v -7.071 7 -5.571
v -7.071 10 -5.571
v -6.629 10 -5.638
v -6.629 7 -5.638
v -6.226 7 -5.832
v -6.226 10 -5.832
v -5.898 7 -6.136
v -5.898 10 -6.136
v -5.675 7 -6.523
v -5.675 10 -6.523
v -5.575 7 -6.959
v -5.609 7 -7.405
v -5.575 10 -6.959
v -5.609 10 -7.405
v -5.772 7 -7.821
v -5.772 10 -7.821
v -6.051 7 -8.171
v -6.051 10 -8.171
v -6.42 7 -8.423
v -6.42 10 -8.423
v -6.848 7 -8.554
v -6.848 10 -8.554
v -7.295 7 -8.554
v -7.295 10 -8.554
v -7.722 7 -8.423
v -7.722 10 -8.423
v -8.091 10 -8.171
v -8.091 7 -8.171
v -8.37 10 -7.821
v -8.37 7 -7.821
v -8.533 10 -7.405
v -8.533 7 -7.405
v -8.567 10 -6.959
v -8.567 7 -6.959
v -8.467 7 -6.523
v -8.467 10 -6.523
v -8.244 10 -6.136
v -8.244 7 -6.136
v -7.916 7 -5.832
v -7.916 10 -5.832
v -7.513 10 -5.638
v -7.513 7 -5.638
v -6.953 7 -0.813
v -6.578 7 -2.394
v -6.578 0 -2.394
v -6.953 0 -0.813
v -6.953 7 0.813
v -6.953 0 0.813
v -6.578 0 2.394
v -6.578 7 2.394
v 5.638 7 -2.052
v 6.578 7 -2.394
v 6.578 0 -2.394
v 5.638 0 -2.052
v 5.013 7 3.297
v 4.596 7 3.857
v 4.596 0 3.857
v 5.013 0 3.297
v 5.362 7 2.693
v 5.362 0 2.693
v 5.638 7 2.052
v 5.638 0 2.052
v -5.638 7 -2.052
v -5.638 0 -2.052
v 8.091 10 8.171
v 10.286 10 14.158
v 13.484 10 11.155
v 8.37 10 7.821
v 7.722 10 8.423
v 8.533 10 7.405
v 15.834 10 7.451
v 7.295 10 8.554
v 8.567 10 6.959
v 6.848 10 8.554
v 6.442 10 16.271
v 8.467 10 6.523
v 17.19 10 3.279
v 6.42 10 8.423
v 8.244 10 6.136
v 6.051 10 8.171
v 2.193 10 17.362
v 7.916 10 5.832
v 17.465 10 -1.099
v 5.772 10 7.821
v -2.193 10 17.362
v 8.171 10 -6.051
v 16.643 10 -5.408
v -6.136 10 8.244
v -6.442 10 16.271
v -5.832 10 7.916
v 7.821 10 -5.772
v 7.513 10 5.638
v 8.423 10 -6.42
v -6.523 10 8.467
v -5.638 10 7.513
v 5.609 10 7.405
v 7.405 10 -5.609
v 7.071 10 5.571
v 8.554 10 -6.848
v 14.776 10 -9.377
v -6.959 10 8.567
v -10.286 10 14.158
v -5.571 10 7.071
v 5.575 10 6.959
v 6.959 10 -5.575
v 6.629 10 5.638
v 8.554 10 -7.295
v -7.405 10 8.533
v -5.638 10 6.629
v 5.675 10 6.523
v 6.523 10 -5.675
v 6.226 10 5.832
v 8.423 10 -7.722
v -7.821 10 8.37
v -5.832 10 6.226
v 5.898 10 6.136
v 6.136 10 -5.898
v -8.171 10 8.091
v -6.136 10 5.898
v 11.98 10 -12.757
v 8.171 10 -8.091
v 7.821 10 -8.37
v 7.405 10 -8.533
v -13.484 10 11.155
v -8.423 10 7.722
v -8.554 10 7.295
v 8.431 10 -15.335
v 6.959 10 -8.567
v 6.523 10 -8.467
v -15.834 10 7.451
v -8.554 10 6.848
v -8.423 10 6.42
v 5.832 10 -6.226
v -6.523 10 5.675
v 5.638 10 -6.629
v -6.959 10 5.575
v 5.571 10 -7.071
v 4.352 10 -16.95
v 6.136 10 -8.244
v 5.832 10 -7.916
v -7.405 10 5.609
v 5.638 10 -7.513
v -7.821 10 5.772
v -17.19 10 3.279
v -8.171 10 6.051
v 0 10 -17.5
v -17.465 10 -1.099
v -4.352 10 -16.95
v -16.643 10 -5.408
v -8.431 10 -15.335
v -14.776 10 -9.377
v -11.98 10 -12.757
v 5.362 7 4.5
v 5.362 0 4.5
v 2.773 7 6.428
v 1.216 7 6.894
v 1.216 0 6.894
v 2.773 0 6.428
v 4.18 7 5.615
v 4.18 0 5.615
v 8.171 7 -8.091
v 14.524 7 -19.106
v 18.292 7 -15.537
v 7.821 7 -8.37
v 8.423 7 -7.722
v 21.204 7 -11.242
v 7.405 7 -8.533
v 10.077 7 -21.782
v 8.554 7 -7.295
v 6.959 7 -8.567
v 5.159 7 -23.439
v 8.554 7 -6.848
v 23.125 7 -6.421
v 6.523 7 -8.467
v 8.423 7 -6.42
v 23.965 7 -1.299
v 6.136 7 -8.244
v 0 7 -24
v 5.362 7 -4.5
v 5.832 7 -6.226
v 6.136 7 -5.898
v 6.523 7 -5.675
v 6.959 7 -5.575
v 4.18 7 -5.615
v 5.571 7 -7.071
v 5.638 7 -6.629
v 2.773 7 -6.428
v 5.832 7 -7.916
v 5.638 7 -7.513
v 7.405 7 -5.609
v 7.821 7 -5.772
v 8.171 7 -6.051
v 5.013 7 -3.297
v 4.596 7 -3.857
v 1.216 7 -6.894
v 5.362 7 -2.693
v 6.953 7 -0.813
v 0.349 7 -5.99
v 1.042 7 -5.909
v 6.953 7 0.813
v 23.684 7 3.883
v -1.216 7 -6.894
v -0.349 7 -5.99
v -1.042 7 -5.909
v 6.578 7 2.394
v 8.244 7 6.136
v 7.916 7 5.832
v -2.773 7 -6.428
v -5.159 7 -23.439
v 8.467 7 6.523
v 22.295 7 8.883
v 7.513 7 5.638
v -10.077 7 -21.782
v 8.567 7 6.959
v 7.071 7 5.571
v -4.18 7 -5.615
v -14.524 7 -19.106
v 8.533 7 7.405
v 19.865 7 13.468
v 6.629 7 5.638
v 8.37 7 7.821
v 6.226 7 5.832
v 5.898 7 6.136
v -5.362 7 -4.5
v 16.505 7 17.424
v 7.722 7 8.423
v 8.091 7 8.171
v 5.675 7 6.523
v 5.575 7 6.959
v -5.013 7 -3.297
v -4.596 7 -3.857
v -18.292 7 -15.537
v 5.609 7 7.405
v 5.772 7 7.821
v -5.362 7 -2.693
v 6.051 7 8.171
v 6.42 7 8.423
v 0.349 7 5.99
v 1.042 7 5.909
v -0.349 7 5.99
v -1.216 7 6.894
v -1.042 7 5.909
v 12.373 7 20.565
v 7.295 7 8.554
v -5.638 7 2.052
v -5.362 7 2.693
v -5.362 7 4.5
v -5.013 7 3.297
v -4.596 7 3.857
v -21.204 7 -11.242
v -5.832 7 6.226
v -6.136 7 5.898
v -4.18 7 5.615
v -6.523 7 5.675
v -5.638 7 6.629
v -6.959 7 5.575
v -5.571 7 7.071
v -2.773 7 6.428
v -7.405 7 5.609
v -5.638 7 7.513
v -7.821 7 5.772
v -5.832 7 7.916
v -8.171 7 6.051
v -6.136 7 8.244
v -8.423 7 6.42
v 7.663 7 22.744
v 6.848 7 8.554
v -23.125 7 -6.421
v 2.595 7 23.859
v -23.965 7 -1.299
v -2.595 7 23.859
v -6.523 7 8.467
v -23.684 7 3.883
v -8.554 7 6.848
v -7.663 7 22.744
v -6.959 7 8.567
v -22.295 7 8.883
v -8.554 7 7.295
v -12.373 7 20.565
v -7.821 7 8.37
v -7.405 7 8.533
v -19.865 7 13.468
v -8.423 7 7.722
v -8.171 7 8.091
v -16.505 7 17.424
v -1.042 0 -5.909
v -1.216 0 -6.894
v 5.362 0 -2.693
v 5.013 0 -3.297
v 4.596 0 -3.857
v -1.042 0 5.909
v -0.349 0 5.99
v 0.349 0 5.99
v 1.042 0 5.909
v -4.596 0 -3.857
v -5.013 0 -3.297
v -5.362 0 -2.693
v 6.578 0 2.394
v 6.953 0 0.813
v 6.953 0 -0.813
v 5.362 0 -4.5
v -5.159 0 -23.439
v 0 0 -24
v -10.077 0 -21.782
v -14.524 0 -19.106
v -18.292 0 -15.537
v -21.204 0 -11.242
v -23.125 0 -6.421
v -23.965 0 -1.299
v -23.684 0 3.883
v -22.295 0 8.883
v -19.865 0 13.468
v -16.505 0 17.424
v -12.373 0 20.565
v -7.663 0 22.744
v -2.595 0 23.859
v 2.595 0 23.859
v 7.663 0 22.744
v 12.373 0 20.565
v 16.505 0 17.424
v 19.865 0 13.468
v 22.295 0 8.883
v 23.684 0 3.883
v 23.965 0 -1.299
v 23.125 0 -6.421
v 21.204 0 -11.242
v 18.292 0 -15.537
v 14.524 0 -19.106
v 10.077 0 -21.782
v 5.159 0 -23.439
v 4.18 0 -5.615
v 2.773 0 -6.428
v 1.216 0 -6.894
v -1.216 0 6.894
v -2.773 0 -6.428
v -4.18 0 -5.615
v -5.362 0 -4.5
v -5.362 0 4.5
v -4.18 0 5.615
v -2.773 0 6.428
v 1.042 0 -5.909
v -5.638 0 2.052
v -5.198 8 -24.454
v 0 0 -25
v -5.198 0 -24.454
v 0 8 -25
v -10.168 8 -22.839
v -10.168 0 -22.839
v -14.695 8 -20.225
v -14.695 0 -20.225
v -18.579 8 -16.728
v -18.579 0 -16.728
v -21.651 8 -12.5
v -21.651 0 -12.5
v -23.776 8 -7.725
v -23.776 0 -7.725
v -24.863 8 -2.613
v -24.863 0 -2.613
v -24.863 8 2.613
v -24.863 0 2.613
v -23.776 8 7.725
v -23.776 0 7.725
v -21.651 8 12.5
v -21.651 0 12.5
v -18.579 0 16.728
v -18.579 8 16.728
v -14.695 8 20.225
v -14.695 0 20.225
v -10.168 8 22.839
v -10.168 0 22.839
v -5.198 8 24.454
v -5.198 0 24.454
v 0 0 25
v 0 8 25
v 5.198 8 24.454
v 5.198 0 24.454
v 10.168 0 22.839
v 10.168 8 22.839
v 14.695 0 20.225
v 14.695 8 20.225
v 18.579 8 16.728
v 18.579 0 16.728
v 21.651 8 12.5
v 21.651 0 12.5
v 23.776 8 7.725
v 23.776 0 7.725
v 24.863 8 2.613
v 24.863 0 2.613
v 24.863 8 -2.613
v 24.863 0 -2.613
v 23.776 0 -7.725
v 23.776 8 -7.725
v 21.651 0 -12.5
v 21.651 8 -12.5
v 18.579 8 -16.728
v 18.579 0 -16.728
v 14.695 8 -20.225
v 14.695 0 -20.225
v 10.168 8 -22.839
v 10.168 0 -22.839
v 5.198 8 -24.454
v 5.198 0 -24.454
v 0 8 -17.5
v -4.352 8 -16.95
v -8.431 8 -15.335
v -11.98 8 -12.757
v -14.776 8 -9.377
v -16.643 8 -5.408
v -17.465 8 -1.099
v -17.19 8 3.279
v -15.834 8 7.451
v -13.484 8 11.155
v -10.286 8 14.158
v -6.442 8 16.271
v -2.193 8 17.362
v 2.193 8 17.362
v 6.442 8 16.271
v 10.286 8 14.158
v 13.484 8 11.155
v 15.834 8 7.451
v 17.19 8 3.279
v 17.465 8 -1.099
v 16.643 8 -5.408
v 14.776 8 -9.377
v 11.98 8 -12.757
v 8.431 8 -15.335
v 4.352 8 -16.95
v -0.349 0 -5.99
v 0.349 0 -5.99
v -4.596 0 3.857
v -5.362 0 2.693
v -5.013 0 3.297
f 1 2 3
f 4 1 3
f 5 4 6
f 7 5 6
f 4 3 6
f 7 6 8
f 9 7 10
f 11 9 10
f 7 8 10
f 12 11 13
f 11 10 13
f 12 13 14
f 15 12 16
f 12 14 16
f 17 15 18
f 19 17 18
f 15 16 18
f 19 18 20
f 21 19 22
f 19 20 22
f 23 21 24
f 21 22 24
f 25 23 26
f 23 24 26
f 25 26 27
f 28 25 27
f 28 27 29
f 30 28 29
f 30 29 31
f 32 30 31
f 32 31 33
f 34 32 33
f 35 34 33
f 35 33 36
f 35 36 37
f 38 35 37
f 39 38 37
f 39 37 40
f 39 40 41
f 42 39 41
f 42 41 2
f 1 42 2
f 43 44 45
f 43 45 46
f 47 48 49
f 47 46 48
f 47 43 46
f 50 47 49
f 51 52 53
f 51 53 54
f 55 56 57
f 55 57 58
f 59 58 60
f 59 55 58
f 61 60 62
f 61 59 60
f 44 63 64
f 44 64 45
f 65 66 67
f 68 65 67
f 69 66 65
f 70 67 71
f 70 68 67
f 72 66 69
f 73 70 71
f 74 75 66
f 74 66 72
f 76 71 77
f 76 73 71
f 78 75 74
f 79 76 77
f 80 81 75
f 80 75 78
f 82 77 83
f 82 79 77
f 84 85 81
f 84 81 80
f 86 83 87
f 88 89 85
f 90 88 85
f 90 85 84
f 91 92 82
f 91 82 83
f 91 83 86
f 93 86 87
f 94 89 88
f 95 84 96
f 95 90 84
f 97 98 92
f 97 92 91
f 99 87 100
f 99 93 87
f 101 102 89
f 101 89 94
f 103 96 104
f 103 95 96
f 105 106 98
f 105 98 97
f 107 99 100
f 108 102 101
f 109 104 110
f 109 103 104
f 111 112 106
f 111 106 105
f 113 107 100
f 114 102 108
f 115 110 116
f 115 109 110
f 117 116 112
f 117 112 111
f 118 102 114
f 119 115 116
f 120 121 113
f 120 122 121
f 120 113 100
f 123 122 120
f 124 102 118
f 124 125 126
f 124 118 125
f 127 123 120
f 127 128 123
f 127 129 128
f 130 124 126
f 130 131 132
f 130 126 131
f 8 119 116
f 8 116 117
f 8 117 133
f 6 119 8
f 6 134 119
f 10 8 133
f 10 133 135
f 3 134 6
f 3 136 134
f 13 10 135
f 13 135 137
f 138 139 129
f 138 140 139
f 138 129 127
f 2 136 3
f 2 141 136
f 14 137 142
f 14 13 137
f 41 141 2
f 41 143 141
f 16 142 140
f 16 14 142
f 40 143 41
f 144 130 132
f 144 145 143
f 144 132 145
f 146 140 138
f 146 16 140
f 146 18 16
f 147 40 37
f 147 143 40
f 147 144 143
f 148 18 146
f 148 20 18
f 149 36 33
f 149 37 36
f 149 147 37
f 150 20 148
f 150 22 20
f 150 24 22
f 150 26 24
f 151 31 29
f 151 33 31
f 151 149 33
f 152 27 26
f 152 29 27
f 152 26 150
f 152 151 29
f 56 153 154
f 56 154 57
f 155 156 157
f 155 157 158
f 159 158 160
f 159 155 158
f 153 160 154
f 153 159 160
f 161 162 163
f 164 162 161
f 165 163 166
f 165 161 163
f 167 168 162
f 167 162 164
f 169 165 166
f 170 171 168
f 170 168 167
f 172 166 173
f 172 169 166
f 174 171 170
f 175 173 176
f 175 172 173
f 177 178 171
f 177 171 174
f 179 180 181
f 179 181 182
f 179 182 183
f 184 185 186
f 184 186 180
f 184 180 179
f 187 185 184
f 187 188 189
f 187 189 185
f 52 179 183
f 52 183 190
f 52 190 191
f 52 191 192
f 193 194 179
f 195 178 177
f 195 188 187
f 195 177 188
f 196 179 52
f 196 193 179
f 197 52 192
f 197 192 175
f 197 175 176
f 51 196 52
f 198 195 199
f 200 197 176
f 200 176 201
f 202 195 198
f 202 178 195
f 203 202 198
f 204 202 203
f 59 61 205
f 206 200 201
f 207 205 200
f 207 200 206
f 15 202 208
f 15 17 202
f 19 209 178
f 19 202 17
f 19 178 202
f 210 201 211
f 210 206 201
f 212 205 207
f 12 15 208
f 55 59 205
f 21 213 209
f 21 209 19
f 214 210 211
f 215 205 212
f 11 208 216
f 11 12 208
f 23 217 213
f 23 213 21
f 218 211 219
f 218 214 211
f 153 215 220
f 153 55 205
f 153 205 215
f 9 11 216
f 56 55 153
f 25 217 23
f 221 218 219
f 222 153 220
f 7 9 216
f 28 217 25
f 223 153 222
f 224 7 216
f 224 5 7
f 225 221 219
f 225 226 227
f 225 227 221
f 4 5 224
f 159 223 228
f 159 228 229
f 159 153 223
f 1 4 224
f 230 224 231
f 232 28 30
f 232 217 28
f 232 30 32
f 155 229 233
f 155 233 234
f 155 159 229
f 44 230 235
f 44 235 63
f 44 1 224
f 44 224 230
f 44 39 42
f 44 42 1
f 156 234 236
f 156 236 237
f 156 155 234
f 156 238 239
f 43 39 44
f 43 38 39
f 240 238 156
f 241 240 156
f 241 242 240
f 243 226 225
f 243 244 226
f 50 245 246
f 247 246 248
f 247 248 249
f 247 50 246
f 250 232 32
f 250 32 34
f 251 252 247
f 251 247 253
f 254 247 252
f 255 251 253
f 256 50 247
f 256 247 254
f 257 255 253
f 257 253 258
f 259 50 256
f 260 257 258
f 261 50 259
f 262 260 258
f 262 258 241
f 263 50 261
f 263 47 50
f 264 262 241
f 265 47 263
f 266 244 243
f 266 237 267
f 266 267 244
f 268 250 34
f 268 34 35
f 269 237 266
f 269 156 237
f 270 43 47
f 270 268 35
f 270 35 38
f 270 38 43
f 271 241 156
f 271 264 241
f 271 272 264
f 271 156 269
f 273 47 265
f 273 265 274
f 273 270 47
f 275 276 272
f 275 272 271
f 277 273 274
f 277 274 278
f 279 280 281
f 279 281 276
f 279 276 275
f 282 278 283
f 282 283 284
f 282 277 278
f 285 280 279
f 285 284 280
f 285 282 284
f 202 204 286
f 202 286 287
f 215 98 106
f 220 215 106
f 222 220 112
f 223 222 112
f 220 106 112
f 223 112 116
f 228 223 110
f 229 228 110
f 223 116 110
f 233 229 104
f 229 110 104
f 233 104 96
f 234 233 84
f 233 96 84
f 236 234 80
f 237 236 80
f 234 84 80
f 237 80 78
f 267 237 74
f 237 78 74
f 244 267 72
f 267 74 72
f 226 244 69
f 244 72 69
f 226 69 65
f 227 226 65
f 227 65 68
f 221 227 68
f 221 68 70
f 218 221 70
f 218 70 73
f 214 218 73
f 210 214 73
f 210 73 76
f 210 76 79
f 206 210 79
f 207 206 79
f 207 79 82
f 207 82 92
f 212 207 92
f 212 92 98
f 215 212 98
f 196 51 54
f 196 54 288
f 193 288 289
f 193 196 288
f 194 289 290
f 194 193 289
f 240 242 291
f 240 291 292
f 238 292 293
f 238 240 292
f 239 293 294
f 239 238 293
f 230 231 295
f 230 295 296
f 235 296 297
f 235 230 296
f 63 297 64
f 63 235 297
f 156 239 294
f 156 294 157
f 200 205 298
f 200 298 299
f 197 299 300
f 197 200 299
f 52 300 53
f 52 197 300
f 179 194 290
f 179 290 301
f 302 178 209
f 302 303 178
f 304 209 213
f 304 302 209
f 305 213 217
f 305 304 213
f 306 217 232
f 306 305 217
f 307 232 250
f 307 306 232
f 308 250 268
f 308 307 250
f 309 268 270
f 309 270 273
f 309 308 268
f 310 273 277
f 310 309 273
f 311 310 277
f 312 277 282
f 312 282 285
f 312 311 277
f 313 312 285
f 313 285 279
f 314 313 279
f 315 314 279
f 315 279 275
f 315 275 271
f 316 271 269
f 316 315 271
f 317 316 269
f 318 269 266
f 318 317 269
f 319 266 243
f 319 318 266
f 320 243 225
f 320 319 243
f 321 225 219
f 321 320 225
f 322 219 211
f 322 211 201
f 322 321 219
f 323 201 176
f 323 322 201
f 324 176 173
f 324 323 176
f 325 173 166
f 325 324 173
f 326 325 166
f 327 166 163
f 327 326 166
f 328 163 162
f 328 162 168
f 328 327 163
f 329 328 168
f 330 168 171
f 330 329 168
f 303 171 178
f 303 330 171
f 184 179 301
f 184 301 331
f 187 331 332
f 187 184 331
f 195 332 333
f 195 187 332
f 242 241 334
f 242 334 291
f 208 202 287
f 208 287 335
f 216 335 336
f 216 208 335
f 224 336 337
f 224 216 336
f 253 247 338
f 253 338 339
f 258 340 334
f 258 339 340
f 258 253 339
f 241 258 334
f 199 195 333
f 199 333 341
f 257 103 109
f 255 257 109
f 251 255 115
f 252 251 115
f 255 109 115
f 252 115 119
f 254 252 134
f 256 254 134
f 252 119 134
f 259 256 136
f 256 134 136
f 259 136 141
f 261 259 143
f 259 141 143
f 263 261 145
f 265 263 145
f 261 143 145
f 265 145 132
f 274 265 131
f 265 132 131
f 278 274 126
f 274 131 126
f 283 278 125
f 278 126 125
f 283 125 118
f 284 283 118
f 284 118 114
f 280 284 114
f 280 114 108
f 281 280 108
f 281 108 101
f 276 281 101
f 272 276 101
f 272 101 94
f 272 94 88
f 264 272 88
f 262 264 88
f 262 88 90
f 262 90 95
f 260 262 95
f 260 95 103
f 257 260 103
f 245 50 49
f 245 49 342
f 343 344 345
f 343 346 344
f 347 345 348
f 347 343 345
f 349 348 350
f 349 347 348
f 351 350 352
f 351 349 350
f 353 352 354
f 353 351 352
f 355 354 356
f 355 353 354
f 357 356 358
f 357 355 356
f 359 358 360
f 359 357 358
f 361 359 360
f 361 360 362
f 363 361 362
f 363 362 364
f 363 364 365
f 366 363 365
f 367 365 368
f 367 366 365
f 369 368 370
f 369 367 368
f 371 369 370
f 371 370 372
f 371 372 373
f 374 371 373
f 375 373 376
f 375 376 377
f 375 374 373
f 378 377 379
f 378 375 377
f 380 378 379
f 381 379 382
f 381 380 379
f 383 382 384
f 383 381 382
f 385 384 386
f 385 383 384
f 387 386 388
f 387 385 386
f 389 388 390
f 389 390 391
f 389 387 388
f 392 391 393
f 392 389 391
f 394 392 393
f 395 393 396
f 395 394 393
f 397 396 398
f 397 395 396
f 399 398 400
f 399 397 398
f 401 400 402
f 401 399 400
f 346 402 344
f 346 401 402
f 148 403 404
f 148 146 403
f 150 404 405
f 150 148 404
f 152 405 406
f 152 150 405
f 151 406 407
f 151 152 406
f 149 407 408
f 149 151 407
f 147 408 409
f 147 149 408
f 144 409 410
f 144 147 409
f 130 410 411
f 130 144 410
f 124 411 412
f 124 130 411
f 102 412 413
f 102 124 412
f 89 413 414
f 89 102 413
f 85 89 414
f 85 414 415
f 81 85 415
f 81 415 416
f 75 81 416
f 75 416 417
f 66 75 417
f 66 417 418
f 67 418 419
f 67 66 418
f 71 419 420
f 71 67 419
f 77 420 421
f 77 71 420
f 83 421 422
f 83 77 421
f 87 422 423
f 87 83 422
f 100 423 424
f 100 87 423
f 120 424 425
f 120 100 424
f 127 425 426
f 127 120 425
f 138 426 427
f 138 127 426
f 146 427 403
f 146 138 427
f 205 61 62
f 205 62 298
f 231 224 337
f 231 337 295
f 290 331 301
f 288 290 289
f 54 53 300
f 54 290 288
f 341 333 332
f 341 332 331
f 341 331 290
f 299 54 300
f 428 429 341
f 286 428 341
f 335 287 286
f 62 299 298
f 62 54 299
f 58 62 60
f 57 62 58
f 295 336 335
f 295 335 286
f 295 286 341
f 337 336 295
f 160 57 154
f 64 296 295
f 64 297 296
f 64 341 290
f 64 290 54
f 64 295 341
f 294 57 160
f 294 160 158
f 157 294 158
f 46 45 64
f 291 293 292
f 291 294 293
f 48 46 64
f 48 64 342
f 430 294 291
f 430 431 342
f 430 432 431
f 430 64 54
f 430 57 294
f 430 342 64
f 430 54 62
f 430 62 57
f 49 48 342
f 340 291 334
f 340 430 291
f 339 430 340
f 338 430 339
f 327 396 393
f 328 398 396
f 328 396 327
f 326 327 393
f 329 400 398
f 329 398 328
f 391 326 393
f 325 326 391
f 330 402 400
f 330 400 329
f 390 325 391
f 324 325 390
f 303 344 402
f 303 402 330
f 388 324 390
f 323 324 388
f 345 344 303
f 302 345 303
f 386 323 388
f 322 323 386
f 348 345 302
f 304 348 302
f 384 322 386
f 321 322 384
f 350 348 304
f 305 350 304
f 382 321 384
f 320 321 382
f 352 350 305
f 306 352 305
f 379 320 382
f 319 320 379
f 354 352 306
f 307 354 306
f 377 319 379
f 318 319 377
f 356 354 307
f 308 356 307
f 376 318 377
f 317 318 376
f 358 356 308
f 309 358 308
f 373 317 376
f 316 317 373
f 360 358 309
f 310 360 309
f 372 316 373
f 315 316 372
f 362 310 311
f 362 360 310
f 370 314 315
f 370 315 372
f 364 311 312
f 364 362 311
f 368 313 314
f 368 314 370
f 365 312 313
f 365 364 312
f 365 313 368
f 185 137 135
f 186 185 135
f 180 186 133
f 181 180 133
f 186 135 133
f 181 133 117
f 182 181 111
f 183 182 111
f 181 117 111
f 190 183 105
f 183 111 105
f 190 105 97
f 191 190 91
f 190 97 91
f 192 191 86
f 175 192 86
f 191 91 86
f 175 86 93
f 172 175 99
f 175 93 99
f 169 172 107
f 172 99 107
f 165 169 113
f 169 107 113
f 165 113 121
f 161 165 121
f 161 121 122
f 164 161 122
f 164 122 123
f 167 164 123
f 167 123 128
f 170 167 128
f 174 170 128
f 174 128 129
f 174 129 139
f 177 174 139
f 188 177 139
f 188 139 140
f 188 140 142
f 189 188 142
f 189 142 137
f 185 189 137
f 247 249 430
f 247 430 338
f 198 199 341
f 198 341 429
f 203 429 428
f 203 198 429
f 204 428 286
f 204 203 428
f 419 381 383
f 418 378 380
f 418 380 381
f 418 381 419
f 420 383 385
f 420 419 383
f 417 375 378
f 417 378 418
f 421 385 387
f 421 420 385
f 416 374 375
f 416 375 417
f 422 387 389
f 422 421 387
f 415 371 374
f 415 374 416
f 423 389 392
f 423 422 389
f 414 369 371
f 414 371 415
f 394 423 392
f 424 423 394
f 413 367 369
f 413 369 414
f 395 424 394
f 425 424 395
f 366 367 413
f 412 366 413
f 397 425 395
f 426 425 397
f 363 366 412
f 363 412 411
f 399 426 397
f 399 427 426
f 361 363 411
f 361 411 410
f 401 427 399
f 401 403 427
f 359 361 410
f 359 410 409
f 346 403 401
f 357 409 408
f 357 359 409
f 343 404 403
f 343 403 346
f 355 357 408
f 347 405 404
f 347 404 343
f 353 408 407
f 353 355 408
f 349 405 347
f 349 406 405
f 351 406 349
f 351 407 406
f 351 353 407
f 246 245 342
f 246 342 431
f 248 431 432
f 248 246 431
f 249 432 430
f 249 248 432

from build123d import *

# Parameters (mm, degrees)
SKETCH3_R          = 1.5
CUT_EXTRUDE1_DEPTH = 37.742346142
CIRPATTERN1_COUNT  = 4
CUT_EXTRUDE2_START = -7
CUT_EXTRUDE2_DEPTH = 7
CIRPATTERN2_COUNT  = 6


with BuildPart() as part:
    # Sketch2 → Revolve1 (revolve)
    with BuildSketch(Plane.XY, mode=Mode.PRIVATE) as revolve1_sk:
        Polygon((0, 0), (7, 0), (7, 7), (24, 7), (24, 0), (25, 0), (25, 8), (17.5, 8), (17.5, 10), (0, 10), align=None)
    revolve(revolve1_sk.sketch.rotate(Axis((0, 0, 0), (0, 1, 0)), 90), axis=Axis((0, 0, 0), (0, 1, 0)))

    # Sketch3 → Cut-Extrude1 (cut, through all)
    with BuildSketch(Plane(origin=(0, 10, 0), x_dir=(1, 0, 0), z_dir=(0, 1, 0))):
        with Locations(Location((-7.071067812, 7.071067812, 0), (0, 0, 270))):
            Circle(SKETCH3_R)
    cut_extrude1 = extrude(amount=-CUT_EXTRUDE1_DEPTH, mode=Mode.SUBTRACT)

    # CirPattern1: Cut-Extrude1 ×4 about axis
    cirpattern1_axis = Axis((0, 0, 0), (0, 1, 0))
    for i in range(1, CIRPATTERN1_COUNT):
        add(cut_extrude1.rotate(cirpattern1_axis, i * 360 / CIRPATTERN1_COUNT), mode=Mode.SUBTRACT)

    # Sketch4 → Cut-Extrude2 (cut)
    with BuildSketch(Plane.XZ.offset(CUT_EXTRUDE2_START)):
        with BuildLine():
            Line((-1.215537244, 6.893654271), (-1.041889066, 5.908846518))
            ThreePointArc((-1.041889066, 5.908846518), (0, 6), (1.041889066, 5.908846518))
            Line((1.041889066, 5.908846518), (1.215537244, 6.893654271))
            ThreePointArc((1.215537244, 6.893654271), (0, 7), (-1.215537244, 6.893654271))
        make_face()
    cut_extrude2 = extrude(amount=CUT_EXTRUDE2_DEPTH, mode=Mode.SUBTRACT)

    # CirPattern2: Cut-Extrude2 ×6 about axis
    cirpattern2_axis = Axis((0, 0, 0), (0, 1, 0))
    for i in range(1, CIRPATTERN2_COUNT):
        add(cut_extrude2.rotate(cirpattern2_axis, i * 360 / CIRPATTERN2_COUNT), mode=Mode.SUBTRACT)


solid = part.part
